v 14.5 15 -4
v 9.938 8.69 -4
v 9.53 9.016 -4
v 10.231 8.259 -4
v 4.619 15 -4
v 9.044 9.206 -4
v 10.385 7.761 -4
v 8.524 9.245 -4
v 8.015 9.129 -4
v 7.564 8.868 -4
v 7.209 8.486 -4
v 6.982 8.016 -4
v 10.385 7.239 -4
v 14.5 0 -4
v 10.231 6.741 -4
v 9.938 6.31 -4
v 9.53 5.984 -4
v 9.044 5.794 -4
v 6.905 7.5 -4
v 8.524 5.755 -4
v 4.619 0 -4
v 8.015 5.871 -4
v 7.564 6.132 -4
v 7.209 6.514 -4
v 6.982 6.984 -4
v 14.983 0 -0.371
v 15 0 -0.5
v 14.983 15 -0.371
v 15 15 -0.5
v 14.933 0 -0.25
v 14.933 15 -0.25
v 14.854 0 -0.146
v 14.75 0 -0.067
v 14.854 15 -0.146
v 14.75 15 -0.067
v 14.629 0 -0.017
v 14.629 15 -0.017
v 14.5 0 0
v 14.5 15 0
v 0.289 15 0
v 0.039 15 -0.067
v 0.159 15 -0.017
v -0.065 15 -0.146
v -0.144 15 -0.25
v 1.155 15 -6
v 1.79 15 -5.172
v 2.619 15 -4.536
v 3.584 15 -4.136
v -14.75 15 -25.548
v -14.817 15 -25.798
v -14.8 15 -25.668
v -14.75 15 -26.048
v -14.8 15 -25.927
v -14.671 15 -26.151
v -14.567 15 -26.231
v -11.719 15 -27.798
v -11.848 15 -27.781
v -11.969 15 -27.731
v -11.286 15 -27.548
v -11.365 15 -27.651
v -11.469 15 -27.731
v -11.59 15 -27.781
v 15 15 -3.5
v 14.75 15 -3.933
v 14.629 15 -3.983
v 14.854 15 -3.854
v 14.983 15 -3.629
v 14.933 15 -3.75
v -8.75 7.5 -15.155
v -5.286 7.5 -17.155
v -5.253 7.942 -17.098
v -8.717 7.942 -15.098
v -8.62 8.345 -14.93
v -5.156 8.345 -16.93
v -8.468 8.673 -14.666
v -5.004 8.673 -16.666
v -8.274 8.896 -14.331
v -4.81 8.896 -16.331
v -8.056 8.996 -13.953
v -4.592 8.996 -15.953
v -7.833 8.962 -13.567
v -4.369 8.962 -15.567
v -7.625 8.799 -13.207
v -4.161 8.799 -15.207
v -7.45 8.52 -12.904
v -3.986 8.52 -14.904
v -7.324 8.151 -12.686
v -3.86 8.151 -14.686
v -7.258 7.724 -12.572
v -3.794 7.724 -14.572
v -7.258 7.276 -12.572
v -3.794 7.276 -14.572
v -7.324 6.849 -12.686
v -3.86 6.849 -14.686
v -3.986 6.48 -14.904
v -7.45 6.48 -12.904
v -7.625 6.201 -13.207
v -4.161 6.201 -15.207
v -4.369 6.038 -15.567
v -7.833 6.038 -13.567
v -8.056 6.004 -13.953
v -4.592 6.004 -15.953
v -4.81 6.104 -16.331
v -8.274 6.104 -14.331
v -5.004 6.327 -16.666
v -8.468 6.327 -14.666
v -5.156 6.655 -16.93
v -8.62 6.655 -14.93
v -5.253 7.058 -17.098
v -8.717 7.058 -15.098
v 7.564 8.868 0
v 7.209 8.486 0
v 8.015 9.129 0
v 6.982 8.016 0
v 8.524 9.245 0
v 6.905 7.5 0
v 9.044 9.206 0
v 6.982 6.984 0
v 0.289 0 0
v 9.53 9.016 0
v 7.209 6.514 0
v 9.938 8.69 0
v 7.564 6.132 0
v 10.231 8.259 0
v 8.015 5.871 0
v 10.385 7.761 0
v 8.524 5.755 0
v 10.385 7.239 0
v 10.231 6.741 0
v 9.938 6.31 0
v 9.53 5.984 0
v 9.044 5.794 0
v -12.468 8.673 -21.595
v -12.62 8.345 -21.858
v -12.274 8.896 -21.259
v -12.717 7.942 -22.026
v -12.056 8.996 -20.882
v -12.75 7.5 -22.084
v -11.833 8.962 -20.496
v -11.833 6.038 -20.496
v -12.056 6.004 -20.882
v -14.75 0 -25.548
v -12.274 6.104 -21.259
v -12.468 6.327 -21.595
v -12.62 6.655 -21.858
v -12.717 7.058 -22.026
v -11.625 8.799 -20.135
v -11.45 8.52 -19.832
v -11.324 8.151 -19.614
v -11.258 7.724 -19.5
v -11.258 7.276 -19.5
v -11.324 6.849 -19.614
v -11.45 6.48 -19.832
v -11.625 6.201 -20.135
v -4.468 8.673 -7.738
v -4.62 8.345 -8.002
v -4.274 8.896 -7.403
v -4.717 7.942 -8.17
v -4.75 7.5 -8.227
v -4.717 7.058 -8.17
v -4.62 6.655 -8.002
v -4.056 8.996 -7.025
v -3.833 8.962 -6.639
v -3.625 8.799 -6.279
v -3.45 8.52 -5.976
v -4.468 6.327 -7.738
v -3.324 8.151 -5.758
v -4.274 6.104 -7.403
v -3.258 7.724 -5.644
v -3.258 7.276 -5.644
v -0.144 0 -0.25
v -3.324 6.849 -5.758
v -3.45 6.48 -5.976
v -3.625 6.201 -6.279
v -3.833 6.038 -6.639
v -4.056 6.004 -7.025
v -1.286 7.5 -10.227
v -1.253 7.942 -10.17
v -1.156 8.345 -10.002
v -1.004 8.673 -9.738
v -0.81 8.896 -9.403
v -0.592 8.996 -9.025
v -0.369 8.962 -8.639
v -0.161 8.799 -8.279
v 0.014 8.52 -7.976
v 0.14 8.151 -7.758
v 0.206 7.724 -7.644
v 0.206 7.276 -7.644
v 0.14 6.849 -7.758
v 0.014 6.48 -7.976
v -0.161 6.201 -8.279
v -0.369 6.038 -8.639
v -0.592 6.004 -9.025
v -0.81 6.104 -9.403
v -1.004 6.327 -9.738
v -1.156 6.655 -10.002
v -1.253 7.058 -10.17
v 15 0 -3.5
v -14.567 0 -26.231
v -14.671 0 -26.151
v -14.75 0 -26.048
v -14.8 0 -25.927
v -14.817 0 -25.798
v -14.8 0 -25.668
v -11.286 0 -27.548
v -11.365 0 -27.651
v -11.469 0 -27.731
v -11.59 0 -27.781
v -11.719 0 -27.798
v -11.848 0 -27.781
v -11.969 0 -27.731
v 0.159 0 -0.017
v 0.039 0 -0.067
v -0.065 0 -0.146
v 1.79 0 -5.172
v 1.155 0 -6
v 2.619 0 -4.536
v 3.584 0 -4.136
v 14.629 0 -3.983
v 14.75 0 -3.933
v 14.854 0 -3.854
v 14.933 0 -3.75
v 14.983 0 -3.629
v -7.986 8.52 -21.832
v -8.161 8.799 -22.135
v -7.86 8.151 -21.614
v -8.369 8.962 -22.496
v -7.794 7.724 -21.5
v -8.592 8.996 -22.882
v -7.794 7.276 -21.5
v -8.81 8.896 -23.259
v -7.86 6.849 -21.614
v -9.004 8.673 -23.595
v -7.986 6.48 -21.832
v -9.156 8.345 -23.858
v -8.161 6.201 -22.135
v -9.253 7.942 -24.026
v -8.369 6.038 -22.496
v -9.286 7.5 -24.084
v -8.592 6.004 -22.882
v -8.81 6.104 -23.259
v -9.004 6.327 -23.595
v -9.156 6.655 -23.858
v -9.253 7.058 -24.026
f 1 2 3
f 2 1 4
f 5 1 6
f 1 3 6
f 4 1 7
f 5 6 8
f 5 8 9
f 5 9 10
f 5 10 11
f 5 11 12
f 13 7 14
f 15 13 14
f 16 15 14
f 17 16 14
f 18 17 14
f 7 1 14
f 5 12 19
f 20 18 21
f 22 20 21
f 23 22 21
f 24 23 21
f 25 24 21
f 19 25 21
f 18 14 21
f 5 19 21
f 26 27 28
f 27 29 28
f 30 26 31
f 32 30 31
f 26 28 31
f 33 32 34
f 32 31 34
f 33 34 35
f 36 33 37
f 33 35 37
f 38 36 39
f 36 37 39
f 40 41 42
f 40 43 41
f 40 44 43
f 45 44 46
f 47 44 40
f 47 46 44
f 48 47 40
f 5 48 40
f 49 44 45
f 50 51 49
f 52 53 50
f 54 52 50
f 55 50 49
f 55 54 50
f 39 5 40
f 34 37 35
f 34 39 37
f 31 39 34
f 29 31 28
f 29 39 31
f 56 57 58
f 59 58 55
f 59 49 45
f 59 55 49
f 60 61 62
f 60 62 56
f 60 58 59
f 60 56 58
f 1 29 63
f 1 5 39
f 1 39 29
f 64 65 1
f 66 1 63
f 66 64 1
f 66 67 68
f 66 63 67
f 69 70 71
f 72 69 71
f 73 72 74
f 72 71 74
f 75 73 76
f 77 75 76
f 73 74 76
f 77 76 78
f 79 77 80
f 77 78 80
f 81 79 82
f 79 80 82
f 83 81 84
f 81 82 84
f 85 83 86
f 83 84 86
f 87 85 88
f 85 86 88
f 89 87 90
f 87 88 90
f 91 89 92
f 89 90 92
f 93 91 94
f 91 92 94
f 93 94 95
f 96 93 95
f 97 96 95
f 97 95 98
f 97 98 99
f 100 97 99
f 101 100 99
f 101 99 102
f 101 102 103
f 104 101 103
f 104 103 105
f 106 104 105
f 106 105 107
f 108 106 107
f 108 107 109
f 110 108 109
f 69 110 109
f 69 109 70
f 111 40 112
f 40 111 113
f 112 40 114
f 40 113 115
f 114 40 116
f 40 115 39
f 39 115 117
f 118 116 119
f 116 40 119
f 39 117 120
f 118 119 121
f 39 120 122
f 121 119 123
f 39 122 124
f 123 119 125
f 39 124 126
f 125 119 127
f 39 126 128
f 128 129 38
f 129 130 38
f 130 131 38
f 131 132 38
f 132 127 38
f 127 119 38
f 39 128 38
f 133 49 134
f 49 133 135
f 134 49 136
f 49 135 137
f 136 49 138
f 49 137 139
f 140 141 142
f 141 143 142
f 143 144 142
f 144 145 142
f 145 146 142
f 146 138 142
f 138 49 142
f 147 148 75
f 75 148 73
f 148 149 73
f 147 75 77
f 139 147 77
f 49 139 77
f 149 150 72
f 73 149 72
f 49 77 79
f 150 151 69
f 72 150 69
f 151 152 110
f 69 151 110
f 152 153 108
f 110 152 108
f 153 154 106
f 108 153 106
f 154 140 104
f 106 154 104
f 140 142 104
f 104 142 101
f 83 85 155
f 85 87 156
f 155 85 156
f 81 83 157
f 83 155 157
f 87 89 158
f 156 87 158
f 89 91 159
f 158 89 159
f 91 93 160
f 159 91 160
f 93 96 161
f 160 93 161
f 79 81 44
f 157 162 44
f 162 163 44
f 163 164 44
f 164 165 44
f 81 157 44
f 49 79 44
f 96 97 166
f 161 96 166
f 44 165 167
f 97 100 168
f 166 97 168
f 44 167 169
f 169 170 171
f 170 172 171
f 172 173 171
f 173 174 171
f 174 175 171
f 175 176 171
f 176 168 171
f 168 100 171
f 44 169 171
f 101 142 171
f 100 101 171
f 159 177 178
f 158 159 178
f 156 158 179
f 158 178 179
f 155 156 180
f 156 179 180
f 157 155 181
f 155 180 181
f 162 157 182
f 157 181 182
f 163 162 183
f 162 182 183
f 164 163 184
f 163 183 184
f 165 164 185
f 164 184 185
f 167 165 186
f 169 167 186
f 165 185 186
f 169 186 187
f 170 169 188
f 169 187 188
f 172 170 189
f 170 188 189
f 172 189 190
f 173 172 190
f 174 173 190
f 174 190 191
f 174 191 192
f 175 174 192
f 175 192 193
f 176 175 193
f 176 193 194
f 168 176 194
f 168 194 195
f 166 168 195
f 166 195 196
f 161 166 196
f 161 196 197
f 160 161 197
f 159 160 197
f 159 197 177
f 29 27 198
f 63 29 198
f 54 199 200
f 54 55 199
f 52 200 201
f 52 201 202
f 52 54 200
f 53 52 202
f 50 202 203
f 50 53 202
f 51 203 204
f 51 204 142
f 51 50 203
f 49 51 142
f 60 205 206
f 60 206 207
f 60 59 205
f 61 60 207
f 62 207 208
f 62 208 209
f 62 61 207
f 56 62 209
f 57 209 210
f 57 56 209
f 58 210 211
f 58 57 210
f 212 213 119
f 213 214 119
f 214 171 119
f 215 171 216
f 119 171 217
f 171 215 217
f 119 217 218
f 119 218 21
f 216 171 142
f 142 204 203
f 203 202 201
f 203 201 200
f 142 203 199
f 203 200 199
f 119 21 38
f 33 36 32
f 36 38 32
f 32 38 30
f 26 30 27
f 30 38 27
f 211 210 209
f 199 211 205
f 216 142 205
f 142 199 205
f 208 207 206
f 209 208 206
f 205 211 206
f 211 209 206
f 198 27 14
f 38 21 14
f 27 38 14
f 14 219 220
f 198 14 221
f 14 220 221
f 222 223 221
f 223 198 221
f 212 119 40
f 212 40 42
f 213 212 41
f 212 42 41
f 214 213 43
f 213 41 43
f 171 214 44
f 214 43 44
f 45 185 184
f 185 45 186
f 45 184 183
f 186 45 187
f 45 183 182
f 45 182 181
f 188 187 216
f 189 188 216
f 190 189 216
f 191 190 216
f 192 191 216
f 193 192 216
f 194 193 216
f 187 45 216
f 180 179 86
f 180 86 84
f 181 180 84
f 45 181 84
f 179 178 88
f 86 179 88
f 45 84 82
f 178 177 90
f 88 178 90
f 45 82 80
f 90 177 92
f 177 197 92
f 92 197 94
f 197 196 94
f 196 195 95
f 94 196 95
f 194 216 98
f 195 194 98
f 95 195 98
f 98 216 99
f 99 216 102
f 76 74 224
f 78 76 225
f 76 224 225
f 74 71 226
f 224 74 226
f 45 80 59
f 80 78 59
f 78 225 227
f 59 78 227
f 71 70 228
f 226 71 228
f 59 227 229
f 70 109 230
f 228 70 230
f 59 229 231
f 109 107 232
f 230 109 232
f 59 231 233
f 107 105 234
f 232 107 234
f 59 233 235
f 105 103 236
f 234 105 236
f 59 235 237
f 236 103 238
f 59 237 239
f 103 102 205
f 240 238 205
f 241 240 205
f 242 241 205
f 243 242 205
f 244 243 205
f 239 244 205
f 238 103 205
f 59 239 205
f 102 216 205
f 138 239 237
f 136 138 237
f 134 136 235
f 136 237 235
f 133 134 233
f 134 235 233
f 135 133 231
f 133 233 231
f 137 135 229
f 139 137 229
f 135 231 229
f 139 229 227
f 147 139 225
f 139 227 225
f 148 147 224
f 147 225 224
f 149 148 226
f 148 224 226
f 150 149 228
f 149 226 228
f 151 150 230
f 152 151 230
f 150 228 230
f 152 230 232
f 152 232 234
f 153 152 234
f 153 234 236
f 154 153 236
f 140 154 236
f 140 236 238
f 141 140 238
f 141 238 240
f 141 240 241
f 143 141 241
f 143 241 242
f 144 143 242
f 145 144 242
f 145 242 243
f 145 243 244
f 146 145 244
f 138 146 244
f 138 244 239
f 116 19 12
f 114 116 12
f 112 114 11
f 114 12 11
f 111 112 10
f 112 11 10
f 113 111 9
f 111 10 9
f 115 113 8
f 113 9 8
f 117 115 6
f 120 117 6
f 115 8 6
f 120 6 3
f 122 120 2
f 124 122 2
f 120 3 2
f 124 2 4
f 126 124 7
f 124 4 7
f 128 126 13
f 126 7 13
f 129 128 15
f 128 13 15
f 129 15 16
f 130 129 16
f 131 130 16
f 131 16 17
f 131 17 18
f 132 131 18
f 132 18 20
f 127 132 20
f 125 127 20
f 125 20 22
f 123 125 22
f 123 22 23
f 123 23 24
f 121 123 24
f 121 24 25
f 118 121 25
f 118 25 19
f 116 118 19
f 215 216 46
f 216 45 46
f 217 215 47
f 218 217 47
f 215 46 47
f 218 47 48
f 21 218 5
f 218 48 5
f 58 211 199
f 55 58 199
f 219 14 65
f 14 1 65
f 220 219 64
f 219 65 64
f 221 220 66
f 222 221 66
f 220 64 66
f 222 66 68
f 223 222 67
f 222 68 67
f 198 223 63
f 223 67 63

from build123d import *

# Parameters (mm, degrees)
EXTRUDE_1_DEPTH        = 15
SKETCH_2_R             = 1.5
CUT_EXTRUDE_1_DEPTH    = 15
PATTERN_LINEAR_1_COUNT = 3
PATTERN_LINEAR_1_PITCH = 8
SKETCH_3_R             = 1.75
CUT_EXTRUDE_2_DEPTH    = 15
FILLET_1_R             = 4
FILLET_2_R             = 0.5


with BuildPart() as part:
    # Эскиз1 → Бобышка-Вытянуть1 (new body)
    with BuildSketch(Plane(origin=(0, 0, 0), x_dir=(1, 0, 0), z_dir=(0, 1, 0))):
        Polygon((-15, 25.980762114), (0, 0), (15, 0), (15, 4), (2.309401077, 4), (-11.535898385, 27.980762114), align=None)
    extrude(amount=EXTRUDE_1_DEPTH)

    # Эскиз2 → Вырез-Вытянуть1 (cut)
    with BuildSketch(Plane(origin=(3.464101615, 0, -2), x_dir=(-0.49999999999999806, 0, -0.8660254037844397), z_dir=(0.8660254037844397, 0, -0.49999999999999806))):
        with Locations((24, 7.5)):
            Circle(SKETCH_2_R)
    cut_extrude_1 = extrude(amount=-CUT_EXTRUDE_1_DEPTH, mode=Mode.SUBTRACT)

    # Линейный массив1: Вырез-Вытянуть1 ×3
    with Locations(*[Vector(0.49999999999999806, 0, 0.8660254037844397) * (i * PATTERN_LINEAR_1_PITCH) for i in range(1, PATTERN_LINEAR_1_COUNT)]):
        add(cut_extrude_1, mode=Mode.SUBTRACT)

    # Эскиз3 → Вырез-Вытянуть2 (cut)
    with BuildSketch(Plane(origin=(0, 0, -4), x_dir=(-1, 0, 0), z_dir=(0, 0, -1))):
        with Locations((-8.654700538, 7.5)):
            Circle(SKETCH_3_R)
    extrude(amount=-CUT_EXTRUDE_2_DEPTH, mode=Mode.SUBTRACT)

    # Скругление1
    fillet_1_edges = [part.edges().sort_by_distance(p)[0] for p in [
        (2.309401077, 7.5, -4),
    ]]
    fillet(fillet_1_edges, radius=FILLET_1_R)

    # Скругление2
    fillet_2_edges = [part.edges().sort_by_distance(p)[0] for p in [
        (0, 7.5, 0),
        (-15, 7.5, -25.980762114),
        (-11.535898385, 7.5, -27.980762114),
        (15, 7.5, -4),
        (15, 7.5, 0),
    ]]
    fillet(fillet_2_edges, radius=FILLET_2_R)


solid = part.part
